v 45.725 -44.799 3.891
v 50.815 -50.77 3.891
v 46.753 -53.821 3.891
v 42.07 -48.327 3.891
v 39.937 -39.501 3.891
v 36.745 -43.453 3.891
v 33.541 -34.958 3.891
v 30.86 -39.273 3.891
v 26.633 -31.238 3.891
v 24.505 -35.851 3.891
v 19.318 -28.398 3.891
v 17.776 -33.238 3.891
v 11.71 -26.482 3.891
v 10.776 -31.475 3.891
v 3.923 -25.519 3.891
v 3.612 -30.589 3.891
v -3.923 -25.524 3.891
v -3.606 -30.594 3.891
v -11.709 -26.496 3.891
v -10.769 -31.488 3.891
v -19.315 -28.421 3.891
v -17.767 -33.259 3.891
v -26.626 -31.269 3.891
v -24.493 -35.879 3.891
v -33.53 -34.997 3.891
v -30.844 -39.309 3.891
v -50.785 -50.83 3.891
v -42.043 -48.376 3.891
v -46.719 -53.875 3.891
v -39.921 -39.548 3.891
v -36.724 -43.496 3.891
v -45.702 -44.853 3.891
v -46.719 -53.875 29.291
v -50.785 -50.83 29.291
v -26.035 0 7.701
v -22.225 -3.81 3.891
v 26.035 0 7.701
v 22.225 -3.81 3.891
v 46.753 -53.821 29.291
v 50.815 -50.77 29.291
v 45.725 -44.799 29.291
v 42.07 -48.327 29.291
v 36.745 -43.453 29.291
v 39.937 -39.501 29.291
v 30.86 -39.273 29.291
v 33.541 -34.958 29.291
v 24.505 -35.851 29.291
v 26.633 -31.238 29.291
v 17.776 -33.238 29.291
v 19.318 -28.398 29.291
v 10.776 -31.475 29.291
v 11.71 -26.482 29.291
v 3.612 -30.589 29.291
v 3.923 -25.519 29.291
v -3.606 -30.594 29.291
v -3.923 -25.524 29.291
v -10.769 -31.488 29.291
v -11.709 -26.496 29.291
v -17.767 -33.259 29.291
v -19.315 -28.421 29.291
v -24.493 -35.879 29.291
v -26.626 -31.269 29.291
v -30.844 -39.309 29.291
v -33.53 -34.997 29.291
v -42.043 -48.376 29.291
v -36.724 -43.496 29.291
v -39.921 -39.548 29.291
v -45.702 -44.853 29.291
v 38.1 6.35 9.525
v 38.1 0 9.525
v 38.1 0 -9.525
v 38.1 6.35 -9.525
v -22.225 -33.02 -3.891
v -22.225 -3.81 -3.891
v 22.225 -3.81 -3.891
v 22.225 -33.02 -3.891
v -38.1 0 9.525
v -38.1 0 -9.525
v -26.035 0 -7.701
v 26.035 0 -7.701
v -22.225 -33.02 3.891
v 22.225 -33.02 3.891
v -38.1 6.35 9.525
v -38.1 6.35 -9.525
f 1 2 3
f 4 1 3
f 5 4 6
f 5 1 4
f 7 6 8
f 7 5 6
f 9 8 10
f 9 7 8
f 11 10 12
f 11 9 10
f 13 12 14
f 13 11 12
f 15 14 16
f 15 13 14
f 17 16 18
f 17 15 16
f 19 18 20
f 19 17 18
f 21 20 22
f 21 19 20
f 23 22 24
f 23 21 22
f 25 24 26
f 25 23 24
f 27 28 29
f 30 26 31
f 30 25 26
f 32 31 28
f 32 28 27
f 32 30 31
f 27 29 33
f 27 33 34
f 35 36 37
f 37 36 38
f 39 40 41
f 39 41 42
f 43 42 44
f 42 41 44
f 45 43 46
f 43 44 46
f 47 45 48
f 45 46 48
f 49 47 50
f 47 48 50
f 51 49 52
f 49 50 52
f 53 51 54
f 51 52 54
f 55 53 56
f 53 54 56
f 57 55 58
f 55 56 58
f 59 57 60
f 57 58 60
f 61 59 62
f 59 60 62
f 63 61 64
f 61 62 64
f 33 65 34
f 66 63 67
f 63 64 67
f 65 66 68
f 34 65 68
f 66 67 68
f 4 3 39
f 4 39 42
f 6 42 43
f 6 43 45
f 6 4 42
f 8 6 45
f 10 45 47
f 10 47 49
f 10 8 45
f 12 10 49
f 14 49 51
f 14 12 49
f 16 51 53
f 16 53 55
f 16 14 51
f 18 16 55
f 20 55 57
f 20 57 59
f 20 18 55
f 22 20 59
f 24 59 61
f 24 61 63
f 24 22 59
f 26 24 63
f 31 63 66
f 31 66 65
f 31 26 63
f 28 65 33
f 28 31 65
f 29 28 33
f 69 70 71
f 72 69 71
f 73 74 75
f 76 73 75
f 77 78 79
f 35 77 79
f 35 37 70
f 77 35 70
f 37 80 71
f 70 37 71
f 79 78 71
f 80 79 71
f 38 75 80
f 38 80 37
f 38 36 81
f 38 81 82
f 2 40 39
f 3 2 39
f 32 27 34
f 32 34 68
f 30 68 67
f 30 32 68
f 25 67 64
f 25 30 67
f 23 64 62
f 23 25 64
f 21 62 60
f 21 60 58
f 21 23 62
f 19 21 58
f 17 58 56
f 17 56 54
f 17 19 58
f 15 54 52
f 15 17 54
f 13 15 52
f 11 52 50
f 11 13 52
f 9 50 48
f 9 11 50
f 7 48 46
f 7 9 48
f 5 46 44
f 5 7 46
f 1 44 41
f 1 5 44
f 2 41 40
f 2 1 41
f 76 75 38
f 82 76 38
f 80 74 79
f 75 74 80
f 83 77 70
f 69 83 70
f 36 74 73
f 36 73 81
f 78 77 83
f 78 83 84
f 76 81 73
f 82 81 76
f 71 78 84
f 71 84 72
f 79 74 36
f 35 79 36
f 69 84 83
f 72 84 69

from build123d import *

# Parameters (mm, degrees)
SKETCH1_W           = 76.2
SKETCH1_H           = 19.05
BOSS_EXTRUDE1_DEPTH = 6.35
SKETCH2_W           = 44.45
SKETCH2_H           = 7.782009592
BOSS_EXTRUDE2_DEPTH = 33.02
EXTRUDE_THIN1_DEPTH = 25.4
CHAMFER1_SIZE       = 3.81


with BuildPart() as part:
    # Sketch1 → Boss-Extrude1 (new body)
    with BuildSketch(Plane(origin=(0, 0, 0), x_dir=(1, 0, 0), z_dir=(0, 1, 0))):
        Rectangle(SKETCH1_W, SKETCH1_H)
    extrude(amount=BOSS_EXTRUDE1_DEPTH)

    # Sketch2 → Boss-Extrude2 (add)
    with BuildSketch(Plane.XZ):
        Rectangle(SKETCH2_W, SKETCH2_H)
    extrude(amount=BOSS_EXTRUDE2_DEPTH)

    # Chamfer1
    chamfer1_edges = [part.edges().sort_by_distance(p)[0] for p in [
        (22.225, 0, 0),
        (0, 0, 3.891004796),
        (-22.225, 0, 0),
        (0, 0, -3.891004796),
    ]]
    chamfer(chamfer1_edges, length=CHAMFER1_SIZE)


with BuildPart() as body_2:
    # Sketch3 → Extrude-Thin1 (new body)
    with BuildSketch(Plane.XY.offset(3.891004796)):
        with BuildLine():
            ThreePointArc((-50.785128532, -50.829721193), (0, -25.4), (50.814854074, -50.77027011))
            Line((50.814854074, -50.77027011), (46.752638302, -53.820647631))
            ThreePointArc((46.752638302, -53.820647631), (0.002972554, -30.47999913), (-46.719345696, -53.875342628))
            Line((-46.719345696, -53.875342628), (-50.785128532, -50.829721193))
        make_face()
    extrude(amount=EXTRUDE_THIN1_DEPTH)


solid = Compound([part.part, body_2.part])
